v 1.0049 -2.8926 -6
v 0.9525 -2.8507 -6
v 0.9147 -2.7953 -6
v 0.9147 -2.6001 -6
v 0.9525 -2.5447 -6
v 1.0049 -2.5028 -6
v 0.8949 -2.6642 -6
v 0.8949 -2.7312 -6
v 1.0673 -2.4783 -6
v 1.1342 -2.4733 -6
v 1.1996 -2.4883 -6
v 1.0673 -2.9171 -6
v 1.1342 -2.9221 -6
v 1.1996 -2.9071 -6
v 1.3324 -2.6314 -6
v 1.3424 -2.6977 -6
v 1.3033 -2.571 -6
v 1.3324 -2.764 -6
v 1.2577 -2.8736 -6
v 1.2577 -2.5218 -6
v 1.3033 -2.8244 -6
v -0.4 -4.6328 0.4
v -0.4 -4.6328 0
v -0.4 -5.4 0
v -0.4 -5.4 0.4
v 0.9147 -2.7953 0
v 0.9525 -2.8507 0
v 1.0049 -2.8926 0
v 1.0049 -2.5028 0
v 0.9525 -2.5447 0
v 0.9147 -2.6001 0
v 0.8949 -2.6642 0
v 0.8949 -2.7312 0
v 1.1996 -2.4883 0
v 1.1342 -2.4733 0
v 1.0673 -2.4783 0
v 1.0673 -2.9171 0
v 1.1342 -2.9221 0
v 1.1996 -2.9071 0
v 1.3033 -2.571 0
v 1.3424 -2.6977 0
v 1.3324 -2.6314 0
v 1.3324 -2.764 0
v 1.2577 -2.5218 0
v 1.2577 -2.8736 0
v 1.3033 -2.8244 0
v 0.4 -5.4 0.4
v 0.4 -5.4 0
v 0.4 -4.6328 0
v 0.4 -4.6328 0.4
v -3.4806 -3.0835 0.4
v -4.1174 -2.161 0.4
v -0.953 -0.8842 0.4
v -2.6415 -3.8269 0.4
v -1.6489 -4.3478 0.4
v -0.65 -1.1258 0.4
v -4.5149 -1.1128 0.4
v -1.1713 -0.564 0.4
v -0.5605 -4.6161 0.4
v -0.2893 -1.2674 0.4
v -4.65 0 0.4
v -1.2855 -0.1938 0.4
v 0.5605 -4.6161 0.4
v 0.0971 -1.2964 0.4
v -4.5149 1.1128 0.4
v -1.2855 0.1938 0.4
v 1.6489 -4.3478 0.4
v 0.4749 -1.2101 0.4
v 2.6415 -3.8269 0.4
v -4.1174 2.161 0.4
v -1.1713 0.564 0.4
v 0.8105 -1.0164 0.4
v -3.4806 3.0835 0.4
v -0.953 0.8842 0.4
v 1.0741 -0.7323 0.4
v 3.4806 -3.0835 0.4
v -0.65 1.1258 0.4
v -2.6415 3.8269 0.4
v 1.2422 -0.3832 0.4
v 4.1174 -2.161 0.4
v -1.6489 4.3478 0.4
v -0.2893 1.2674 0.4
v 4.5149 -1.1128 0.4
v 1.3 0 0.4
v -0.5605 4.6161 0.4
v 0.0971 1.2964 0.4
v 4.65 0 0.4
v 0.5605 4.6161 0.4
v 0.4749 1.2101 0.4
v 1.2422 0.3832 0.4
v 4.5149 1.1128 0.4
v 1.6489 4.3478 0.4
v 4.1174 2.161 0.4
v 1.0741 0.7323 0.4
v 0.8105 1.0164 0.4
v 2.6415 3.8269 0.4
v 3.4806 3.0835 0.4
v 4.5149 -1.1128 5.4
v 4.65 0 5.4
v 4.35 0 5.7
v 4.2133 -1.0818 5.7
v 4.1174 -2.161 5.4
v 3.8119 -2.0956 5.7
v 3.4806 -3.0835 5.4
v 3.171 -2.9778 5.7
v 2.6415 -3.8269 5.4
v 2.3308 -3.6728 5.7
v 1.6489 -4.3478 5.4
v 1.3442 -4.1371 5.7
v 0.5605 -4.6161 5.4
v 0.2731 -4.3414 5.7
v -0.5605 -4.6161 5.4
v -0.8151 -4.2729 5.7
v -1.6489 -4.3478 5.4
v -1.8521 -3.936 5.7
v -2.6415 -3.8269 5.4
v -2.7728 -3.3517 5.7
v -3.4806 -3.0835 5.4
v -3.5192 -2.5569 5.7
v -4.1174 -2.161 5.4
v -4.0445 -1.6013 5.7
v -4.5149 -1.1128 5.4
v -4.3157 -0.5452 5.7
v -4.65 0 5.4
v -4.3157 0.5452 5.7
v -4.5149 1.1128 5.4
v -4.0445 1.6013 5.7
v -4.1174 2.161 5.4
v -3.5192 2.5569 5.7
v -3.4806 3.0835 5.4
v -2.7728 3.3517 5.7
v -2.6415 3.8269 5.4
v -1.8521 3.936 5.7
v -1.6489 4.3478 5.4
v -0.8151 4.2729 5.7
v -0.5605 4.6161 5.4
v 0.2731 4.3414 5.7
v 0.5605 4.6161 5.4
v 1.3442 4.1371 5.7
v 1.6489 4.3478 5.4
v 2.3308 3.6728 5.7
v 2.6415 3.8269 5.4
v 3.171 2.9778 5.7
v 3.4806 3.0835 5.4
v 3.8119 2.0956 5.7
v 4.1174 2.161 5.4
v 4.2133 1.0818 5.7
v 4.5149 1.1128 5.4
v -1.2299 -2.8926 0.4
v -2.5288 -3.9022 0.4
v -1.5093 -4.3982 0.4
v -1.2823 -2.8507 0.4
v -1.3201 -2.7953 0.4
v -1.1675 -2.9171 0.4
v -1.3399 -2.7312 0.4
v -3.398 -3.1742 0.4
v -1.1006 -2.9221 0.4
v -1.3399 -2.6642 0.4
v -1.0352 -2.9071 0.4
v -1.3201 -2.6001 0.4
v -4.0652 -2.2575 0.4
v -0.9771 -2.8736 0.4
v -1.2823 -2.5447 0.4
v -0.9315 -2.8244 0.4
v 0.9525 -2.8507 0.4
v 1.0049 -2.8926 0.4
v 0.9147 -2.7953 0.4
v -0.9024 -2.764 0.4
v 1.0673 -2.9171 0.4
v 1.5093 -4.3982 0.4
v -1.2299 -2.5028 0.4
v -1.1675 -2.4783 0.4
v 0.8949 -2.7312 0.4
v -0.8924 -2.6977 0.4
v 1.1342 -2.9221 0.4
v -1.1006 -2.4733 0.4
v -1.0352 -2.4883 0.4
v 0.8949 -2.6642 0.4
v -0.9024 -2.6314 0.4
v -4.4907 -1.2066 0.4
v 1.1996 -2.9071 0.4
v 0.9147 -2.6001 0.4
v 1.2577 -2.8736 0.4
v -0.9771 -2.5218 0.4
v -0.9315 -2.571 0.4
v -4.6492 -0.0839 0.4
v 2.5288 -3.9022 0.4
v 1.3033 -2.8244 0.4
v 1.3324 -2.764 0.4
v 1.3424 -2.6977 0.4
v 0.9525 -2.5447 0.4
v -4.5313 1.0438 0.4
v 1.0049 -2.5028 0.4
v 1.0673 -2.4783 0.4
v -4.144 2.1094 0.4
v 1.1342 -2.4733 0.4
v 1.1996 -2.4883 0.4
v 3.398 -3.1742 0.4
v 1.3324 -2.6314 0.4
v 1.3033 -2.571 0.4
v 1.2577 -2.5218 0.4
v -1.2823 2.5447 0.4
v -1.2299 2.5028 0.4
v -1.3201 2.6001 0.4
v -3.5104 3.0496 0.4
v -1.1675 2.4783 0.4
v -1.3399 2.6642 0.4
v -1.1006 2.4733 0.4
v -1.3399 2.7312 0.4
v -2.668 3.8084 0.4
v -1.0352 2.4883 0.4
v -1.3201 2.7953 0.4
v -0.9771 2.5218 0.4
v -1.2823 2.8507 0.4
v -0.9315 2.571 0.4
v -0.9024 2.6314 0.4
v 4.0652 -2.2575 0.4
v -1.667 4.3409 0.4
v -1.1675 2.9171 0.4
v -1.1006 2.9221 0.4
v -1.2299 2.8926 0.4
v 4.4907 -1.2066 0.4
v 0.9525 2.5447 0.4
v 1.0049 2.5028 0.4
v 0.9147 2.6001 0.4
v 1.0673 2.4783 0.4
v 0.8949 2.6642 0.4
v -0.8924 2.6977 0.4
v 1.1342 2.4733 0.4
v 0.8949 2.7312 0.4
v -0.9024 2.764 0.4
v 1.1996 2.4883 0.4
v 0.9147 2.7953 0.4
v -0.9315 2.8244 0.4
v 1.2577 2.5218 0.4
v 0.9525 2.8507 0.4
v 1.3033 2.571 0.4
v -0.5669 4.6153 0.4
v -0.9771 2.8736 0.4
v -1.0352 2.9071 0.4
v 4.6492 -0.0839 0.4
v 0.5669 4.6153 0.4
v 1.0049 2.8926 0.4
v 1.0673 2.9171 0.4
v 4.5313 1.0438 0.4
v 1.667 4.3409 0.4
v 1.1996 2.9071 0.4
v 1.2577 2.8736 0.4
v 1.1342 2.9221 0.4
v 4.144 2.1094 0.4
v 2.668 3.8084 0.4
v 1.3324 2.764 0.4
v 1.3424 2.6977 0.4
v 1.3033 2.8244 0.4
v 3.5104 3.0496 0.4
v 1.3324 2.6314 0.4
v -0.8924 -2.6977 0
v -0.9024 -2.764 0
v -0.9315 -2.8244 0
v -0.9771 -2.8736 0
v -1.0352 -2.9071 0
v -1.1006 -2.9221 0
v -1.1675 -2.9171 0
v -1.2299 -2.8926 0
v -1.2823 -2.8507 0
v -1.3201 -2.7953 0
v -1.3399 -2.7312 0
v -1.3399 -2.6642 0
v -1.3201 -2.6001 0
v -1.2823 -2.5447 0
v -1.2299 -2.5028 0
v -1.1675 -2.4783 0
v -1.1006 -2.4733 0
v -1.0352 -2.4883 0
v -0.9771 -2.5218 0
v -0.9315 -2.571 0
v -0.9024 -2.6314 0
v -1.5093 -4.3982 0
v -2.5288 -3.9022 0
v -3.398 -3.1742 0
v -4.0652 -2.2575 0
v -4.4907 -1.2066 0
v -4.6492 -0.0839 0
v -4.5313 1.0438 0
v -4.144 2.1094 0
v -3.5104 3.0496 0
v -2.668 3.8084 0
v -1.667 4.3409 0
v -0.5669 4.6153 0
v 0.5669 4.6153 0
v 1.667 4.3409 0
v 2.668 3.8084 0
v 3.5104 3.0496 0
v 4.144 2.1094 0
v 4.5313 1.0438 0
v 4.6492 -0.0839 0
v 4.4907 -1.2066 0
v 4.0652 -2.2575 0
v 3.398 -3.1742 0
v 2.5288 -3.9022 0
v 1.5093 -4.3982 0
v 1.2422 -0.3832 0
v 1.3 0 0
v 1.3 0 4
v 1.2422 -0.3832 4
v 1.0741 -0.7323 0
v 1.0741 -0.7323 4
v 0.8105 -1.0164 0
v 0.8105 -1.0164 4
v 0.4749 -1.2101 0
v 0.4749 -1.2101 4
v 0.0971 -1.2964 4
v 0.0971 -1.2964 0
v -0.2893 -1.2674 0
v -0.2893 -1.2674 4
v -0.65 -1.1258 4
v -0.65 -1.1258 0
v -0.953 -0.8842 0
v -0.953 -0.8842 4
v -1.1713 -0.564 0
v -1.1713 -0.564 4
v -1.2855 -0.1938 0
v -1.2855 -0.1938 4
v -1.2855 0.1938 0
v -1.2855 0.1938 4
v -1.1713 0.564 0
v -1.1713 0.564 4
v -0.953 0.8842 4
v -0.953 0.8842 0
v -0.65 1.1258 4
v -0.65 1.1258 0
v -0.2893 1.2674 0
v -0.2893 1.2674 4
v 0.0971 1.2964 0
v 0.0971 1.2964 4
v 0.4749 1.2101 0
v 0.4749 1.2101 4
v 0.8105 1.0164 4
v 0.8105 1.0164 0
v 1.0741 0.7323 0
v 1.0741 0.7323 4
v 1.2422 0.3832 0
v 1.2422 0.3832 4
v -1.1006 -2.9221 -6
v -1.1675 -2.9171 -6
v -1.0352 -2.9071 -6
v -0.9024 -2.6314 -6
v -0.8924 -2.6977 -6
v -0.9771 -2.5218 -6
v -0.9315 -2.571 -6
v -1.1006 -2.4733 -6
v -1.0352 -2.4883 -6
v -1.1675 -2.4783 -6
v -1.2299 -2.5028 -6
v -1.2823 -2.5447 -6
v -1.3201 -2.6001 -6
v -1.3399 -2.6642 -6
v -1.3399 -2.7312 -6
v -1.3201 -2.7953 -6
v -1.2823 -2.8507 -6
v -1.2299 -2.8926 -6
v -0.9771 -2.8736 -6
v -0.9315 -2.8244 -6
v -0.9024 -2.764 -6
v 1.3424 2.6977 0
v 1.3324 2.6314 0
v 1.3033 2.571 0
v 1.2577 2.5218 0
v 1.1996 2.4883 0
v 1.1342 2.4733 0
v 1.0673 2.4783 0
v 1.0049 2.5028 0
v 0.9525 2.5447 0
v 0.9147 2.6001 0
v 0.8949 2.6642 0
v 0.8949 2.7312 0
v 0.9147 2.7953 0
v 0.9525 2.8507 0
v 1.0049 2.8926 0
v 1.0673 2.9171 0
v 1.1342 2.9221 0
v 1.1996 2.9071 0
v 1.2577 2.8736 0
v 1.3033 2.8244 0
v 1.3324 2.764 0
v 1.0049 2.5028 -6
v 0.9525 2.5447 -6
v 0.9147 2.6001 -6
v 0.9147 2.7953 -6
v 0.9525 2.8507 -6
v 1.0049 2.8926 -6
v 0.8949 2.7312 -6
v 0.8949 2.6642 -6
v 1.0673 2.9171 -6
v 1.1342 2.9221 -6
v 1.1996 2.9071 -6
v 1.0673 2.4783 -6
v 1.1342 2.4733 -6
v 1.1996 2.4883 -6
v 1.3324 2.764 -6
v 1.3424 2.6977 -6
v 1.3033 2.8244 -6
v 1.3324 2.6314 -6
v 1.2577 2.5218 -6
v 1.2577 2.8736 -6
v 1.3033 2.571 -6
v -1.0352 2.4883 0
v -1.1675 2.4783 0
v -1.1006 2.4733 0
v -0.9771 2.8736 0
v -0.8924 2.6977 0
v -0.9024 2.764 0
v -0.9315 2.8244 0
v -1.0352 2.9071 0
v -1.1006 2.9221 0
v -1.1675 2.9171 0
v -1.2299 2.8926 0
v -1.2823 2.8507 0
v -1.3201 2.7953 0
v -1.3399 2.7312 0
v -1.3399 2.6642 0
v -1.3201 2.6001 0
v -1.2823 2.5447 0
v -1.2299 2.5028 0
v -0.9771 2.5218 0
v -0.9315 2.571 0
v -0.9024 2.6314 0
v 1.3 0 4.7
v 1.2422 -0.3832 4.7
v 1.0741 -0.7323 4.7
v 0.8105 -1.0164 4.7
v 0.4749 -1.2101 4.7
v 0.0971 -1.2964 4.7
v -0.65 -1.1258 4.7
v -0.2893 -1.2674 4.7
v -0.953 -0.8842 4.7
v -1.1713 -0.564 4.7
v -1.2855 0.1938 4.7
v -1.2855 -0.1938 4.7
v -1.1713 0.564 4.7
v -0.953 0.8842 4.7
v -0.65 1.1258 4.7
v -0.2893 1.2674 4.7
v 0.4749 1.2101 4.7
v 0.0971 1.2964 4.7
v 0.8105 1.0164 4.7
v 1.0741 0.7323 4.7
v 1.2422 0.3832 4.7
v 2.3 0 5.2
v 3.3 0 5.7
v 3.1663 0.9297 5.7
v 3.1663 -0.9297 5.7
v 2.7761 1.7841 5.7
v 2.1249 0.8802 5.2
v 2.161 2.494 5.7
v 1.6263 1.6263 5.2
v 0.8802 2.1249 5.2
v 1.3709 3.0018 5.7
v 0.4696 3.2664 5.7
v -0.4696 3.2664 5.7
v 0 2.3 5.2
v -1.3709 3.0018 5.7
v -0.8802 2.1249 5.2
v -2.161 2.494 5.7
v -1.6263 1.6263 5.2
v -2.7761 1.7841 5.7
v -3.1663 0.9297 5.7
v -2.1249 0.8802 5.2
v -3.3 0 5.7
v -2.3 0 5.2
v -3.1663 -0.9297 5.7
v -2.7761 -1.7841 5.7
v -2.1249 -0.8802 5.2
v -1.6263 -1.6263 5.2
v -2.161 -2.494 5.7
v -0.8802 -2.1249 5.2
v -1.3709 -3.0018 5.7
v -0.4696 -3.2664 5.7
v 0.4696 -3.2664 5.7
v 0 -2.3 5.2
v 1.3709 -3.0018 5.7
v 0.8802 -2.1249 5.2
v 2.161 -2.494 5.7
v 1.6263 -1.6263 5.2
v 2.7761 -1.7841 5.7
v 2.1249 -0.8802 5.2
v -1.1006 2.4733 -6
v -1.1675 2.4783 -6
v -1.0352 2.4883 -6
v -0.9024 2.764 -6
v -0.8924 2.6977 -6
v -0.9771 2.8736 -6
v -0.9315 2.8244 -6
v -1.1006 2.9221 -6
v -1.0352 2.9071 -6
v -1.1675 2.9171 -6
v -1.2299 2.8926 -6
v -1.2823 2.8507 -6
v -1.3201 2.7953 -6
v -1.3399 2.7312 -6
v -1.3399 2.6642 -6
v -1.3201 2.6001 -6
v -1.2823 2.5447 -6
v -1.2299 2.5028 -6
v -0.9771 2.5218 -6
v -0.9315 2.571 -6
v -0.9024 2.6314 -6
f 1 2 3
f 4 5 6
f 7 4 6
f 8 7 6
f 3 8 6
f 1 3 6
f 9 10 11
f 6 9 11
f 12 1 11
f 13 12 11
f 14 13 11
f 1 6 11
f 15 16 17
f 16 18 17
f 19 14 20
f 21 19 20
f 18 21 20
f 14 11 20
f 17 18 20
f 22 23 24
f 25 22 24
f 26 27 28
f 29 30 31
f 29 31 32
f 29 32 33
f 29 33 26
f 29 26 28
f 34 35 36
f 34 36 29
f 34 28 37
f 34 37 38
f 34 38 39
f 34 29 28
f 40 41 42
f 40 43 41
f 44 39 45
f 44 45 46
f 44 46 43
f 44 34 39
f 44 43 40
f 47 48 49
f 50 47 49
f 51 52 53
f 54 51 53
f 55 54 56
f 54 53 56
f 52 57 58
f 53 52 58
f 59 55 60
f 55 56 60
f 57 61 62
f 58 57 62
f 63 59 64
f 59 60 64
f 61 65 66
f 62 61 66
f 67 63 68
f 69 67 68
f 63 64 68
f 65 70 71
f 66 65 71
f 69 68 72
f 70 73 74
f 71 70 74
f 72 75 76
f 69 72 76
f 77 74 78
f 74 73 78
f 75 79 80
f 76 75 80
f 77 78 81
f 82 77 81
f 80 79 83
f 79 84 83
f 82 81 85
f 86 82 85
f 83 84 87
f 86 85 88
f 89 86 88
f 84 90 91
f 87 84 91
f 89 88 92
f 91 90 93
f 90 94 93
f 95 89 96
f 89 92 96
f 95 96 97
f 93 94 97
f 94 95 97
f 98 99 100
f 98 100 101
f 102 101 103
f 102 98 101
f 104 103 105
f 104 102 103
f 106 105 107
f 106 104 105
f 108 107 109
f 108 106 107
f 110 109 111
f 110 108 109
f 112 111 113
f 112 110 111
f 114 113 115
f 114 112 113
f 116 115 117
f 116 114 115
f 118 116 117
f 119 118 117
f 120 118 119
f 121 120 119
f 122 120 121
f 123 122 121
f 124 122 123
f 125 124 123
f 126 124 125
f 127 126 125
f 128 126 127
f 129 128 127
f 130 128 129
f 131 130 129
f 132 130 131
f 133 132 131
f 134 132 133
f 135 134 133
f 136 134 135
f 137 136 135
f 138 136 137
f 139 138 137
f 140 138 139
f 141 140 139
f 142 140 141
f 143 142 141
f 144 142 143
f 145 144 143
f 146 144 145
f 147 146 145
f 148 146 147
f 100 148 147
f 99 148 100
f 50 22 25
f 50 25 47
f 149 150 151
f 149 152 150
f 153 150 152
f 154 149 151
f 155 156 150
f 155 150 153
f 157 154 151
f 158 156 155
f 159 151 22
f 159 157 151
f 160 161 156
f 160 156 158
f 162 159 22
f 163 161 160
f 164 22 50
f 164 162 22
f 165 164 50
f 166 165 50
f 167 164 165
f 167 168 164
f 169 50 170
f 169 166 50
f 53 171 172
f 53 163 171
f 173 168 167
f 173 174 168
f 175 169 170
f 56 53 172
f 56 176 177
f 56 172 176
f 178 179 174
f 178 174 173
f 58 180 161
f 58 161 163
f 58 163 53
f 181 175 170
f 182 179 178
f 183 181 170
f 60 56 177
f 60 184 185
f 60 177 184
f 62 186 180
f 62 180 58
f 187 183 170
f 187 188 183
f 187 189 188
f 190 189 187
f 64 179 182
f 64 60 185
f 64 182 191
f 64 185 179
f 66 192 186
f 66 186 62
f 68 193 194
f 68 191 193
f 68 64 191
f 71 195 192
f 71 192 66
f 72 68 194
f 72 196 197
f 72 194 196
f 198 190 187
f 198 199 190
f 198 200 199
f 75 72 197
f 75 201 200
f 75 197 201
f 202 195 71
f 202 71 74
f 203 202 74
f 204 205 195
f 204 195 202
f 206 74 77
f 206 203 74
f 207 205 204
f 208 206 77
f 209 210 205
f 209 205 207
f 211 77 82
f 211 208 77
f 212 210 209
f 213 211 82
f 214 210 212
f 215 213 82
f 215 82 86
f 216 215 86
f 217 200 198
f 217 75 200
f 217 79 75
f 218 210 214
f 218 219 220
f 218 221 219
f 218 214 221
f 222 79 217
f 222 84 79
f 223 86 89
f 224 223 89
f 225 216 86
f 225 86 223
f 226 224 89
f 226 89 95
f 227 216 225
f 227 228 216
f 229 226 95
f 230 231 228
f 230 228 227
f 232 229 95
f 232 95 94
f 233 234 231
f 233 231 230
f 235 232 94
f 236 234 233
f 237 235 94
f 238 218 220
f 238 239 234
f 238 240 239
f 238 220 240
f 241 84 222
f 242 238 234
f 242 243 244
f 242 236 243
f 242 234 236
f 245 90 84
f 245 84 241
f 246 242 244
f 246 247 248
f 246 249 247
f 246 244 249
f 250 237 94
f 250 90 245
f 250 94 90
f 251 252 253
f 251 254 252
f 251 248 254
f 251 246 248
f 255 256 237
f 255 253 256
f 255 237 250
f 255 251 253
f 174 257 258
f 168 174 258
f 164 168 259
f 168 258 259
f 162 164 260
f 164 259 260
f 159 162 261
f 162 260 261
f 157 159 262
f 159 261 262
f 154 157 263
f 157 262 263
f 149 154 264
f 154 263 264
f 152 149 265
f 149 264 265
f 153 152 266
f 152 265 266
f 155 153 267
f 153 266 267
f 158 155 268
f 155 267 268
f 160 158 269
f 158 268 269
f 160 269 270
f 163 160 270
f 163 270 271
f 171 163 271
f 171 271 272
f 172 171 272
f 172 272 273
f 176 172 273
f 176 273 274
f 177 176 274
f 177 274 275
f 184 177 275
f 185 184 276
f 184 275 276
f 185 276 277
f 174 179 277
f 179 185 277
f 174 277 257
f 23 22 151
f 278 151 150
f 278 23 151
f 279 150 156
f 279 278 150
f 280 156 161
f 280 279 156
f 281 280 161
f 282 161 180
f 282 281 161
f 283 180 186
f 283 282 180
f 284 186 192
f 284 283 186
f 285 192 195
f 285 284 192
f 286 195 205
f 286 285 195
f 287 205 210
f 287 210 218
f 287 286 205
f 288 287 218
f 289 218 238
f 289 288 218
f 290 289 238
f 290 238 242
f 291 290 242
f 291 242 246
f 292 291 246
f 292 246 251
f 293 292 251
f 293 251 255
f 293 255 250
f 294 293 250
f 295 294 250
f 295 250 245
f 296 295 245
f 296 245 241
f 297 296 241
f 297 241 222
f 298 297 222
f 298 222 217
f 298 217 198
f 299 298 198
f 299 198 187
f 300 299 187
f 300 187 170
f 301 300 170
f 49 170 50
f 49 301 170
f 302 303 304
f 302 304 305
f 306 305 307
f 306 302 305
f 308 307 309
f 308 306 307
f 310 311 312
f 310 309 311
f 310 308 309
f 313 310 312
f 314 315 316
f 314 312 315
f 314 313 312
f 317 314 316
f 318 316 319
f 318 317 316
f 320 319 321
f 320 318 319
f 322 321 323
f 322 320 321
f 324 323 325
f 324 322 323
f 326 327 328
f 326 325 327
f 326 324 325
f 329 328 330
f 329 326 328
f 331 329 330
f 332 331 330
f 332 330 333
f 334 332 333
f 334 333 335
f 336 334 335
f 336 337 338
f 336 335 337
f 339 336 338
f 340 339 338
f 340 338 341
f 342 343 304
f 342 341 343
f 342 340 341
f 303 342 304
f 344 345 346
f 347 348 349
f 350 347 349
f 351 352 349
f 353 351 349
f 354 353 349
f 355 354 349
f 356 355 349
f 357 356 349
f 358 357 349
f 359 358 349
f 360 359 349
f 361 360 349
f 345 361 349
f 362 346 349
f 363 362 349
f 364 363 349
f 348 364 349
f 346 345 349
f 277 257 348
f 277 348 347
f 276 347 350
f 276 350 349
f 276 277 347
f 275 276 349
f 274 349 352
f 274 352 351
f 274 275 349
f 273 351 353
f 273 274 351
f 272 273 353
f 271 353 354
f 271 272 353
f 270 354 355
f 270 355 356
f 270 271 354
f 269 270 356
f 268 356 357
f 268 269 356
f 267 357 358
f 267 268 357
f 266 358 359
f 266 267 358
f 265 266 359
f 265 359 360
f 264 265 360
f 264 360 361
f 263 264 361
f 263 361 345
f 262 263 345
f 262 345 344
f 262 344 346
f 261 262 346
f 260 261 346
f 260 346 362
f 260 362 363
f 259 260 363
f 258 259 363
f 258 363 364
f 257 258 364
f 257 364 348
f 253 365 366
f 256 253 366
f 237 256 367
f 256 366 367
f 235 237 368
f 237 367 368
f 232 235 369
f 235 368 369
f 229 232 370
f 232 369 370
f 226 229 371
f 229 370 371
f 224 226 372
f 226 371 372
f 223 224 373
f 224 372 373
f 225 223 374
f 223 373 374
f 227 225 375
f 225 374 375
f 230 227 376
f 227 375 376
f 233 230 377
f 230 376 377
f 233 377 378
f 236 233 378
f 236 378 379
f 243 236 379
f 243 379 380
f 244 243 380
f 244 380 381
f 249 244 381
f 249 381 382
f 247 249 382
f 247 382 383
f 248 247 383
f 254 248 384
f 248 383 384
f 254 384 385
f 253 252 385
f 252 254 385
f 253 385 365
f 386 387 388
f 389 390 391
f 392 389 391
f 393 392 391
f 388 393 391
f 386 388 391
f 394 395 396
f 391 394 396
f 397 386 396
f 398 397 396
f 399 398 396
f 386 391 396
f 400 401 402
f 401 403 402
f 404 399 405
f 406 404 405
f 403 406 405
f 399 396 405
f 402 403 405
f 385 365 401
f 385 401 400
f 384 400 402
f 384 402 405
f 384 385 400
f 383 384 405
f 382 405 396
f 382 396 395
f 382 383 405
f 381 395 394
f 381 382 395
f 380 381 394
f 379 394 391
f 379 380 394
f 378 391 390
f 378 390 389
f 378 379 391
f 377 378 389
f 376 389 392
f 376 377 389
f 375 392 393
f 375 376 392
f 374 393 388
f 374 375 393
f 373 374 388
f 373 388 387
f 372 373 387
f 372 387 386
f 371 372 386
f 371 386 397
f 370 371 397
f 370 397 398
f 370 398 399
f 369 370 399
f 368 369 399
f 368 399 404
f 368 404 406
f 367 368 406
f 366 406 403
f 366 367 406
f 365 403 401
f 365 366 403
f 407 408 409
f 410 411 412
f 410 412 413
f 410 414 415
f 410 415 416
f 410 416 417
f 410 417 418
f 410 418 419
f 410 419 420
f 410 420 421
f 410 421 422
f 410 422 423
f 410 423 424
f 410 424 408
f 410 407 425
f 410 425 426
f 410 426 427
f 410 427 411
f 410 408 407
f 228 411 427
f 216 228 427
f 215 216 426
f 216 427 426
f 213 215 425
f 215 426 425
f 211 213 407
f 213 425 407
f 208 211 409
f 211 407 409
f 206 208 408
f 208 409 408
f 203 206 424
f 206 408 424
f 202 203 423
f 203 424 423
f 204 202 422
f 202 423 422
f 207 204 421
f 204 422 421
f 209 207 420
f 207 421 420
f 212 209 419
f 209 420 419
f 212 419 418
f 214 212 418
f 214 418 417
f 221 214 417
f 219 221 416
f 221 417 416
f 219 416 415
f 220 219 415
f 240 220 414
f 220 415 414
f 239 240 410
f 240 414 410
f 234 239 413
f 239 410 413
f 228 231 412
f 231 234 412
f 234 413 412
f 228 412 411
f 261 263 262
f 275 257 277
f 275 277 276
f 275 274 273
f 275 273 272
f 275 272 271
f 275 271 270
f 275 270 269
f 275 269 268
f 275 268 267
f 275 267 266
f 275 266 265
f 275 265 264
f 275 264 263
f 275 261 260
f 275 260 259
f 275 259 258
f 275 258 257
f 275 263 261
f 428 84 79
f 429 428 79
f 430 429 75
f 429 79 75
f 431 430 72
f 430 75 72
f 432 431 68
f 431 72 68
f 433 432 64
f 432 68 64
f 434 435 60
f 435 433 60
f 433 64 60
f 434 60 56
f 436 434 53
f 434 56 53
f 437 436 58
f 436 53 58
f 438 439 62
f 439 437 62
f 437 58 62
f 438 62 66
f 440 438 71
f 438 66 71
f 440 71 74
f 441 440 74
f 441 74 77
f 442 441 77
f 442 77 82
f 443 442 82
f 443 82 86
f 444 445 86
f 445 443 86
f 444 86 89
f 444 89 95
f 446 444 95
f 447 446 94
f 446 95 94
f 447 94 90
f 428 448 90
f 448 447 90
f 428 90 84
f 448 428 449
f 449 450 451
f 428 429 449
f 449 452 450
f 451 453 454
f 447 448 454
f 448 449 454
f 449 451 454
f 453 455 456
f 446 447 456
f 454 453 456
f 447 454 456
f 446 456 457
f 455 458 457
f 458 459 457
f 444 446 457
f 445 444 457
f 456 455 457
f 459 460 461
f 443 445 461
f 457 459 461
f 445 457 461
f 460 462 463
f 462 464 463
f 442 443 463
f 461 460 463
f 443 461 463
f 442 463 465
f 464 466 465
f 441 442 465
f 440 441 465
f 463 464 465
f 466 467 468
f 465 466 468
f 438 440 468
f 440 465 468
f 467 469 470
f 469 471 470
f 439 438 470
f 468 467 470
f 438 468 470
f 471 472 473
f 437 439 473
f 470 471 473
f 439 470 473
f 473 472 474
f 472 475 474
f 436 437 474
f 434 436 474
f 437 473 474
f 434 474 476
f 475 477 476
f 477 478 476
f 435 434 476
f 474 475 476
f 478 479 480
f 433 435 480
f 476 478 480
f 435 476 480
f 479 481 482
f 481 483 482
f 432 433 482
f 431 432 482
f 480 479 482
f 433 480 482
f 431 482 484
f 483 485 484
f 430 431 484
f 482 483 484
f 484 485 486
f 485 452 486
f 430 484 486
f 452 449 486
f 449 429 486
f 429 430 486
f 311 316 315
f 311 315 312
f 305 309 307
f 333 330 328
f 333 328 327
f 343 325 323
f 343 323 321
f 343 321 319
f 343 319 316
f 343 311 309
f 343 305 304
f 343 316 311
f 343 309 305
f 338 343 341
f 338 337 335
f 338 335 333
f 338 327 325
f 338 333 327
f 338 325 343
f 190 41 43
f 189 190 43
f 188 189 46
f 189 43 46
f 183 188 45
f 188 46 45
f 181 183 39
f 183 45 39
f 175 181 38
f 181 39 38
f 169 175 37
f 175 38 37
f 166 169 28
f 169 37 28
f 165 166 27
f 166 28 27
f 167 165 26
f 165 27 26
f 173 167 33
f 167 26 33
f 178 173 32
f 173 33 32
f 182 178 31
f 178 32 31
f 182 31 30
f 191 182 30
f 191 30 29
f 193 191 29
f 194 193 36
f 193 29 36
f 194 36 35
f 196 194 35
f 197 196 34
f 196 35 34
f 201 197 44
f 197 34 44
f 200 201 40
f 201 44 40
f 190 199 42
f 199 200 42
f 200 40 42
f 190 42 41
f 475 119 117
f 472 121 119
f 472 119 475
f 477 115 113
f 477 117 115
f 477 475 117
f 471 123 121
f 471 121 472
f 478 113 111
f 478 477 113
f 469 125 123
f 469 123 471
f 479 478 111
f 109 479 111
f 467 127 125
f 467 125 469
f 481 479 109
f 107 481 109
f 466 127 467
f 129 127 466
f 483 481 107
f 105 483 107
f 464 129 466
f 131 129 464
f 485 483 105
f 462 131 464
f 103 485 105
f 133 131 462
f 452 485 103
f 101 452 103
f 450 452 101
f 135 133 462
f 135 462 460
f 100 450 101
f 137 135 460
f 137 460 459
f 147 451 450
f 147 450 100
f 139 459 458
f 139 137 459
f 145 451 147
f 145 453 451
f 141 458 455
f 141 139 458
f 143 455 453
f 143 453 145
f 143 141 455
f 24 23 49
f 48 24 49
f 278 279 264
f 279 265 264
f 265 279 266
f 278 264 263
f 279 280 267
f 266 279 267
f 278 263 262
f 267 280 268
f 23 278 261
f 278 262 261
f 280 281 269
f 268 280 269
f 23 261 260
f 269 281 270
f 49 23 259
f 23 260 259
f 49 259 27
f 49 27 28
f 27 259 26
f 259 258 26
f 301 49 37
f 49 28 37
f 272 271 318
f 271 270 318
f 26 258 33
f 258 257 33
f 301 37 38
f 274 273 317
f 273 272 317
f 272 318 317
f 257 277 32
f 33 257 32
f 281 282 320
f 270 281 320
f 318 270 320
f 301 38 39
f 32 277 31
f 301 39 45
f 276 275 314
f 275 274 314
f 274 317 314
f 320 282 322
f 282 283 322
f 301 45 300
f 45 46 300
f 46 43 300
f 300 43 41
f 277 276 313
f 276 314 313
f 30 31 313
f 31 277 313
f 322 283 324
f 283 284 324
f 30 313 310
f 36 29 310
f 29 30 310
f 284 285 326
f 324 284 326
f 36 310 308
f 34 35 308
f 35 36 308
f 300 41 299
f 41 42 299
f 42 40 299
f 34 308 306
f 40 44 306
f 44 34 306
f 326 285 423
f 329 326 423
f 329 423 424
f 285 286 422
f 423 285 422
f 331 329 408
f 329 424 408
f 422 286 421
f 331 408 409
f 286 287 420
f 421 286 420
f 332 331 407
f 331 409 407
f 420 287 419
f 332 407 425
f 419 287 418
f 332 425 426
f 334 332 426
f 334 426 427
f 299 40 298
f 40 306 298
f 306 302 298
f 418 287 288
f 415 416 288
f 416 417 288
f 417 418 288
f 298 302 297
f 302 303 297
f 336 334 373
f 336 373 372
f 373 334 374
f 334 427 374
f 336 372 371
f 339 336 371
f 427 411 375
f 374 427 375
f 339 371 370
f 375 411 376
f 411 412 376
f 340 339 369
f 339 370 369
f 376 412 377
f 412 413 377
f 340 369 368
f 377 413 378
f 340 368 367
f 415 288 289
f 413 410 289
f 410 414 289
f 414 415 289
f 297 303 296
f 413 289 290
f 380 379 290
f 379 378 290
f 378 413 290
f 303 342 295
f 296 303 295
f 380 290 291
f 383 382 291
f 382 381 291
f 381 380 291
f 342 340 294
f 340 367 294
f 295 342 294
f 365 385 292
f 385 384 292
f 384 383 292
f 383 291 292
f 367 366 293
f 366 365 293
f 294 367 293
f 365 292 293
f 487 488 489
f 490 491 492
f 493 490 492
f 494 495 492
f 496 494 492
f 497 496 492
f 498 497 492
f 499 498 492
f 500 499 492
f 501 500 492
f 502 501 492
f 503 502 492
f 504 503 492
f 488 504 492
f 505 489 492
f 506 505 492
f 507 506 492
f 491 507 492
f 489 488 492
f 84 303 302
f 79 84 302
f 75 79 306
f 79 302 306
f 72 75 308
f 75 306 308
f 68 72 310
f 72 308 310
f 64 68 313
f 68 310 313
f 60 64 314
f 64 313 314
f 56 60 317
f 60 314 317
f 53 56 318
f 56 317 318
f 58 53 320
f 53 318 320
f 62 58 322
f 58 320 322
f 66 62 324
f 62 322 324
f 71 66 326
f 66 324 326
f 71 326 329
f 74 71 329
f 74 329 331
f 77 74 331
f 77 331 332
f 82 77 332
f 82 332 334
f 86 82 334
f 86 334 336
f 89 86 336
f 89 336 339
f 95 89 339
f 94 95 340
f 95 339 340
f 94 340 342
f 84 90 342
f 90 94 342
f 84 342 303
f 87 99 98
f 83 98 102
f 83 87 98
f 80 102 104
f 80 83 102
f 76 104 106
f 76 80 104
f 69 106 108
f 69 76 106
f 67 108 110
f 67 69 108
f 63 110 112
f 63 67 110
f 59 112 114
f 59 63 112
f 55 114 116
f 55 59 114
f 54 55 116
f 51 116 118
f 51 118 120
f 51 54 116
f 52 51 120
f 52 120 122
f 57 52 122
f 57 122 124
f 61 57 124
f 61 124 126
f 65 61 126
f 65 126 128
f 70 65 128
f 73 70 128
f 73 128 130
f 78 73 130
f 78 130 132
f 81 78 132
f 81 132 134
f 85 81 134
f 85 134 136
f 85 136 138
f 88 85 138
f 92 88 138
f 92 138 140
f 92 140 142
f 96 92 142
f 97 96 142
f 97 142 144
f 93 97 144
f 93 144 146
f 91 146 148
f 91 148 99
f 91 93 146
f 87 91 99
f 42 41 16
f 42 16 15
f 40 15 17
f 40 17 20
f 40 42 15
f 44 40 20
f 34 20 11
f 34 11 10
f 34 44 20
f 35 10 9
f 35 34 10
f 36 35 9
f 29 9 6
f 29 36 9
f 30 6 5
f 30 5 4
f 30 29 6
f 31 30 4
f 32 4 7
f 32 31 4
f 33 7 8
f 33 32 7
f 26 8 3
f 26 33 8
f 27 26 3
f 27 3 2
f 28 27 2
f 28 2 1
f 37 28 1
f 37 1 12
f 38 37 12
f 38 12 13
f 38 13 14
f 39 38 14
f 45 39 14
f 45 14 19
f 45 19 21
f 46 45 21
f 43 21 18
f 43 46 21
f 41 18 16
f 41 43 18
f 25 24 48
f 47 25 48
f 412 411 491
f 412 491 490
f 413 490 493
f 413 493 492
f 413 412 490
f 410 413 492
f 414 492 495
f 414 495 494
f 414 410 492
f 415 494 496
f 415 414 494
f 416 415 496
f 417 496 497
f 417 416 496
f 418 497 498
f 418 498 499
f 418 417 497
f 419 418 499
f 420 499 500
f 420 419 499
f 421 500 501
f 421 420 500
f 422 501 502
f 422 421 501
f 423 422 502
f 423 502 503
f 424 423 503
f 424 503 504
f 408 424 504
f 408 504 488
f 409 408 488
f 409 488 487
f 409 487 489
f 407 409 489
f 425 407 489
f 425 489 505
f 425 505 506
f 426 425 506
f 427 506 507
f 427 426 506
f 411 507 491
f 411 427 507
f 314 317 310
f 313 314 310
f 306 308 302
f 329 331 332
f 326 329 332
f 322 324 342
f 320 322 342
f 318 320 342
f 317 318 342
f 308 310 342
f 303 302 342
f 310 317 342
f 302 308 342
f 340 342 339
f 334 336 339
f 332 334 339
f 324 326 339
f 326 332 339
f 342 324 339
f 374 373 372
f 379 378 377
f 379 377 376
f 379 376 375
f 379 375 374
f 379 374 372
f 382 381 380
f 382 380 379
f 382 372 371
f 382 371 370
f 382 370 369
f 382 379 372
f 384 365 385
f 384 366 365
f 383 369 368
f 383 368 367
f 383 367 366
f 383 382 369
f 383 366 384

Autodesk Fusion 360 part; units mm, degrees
sketch "Sketch1" plane through (0, 0, 0) normal (0, 0, 1) x (1, 0, 0)
  circle A0 centre (0, 0) radius 4.65
  circle A1 centre (0, 0) radius 1.3
  line L0 (-0.4, -5.4) -> (0.4, -5.4)
  line L1 (0.4, -5.4) -> (0.4, -4.6328)
  line L2 (-0.4, -4.6328) -> (-0.4, -5.4)
  circle A2 centre (-1.1174, -2.6977) radius 0.225
  circle A3 centre (1.1174, -2.6977) radius 0.225
  circle A4 centre (1.1174, 2.6977) radius 0.225
  circle A5 centre (-1.1174, 2.6977) radius 0.225
  dimension "d11" = 360
extrude "Extrude1" add sketch "Sketch1" along normal blind 5.7 and the other way blind -0.4 contours A0 | A2 | A3 | A4 | A5 makes body 1
extrude "Extrude2" add sketch "Sketch1" along normal blind 0.4 separate body makes body 2
extrude "Extrude3" add sketch "Sketch1" against normal blind 6 separate body contours A2 | A3 | A4 | A5 makes body 3 at (-0.8927, -2.7089, -4) makes body 4 at (-0.8927, 2.6865, -4) makes body 5 at (1.3422, -2.7089, -4) makes body 6 at (1.3422, 2.6865, -4)
extrude "Extrude4" add sketch "Sketch1" along normal blind 4 separate body contours A1 makes body 7
chamfer "Chamfer1" distance 0.3 angle 45 1 edges at (-4.3353, -1.6815, 5.7) on bodies 1
chamfer "Chamfer2" distance 2 distance2 1 1 edges at (-1.212, 0.4701, 5.7) measured on face at (3.3171, 0.2161, 5.7) on bodies 1
